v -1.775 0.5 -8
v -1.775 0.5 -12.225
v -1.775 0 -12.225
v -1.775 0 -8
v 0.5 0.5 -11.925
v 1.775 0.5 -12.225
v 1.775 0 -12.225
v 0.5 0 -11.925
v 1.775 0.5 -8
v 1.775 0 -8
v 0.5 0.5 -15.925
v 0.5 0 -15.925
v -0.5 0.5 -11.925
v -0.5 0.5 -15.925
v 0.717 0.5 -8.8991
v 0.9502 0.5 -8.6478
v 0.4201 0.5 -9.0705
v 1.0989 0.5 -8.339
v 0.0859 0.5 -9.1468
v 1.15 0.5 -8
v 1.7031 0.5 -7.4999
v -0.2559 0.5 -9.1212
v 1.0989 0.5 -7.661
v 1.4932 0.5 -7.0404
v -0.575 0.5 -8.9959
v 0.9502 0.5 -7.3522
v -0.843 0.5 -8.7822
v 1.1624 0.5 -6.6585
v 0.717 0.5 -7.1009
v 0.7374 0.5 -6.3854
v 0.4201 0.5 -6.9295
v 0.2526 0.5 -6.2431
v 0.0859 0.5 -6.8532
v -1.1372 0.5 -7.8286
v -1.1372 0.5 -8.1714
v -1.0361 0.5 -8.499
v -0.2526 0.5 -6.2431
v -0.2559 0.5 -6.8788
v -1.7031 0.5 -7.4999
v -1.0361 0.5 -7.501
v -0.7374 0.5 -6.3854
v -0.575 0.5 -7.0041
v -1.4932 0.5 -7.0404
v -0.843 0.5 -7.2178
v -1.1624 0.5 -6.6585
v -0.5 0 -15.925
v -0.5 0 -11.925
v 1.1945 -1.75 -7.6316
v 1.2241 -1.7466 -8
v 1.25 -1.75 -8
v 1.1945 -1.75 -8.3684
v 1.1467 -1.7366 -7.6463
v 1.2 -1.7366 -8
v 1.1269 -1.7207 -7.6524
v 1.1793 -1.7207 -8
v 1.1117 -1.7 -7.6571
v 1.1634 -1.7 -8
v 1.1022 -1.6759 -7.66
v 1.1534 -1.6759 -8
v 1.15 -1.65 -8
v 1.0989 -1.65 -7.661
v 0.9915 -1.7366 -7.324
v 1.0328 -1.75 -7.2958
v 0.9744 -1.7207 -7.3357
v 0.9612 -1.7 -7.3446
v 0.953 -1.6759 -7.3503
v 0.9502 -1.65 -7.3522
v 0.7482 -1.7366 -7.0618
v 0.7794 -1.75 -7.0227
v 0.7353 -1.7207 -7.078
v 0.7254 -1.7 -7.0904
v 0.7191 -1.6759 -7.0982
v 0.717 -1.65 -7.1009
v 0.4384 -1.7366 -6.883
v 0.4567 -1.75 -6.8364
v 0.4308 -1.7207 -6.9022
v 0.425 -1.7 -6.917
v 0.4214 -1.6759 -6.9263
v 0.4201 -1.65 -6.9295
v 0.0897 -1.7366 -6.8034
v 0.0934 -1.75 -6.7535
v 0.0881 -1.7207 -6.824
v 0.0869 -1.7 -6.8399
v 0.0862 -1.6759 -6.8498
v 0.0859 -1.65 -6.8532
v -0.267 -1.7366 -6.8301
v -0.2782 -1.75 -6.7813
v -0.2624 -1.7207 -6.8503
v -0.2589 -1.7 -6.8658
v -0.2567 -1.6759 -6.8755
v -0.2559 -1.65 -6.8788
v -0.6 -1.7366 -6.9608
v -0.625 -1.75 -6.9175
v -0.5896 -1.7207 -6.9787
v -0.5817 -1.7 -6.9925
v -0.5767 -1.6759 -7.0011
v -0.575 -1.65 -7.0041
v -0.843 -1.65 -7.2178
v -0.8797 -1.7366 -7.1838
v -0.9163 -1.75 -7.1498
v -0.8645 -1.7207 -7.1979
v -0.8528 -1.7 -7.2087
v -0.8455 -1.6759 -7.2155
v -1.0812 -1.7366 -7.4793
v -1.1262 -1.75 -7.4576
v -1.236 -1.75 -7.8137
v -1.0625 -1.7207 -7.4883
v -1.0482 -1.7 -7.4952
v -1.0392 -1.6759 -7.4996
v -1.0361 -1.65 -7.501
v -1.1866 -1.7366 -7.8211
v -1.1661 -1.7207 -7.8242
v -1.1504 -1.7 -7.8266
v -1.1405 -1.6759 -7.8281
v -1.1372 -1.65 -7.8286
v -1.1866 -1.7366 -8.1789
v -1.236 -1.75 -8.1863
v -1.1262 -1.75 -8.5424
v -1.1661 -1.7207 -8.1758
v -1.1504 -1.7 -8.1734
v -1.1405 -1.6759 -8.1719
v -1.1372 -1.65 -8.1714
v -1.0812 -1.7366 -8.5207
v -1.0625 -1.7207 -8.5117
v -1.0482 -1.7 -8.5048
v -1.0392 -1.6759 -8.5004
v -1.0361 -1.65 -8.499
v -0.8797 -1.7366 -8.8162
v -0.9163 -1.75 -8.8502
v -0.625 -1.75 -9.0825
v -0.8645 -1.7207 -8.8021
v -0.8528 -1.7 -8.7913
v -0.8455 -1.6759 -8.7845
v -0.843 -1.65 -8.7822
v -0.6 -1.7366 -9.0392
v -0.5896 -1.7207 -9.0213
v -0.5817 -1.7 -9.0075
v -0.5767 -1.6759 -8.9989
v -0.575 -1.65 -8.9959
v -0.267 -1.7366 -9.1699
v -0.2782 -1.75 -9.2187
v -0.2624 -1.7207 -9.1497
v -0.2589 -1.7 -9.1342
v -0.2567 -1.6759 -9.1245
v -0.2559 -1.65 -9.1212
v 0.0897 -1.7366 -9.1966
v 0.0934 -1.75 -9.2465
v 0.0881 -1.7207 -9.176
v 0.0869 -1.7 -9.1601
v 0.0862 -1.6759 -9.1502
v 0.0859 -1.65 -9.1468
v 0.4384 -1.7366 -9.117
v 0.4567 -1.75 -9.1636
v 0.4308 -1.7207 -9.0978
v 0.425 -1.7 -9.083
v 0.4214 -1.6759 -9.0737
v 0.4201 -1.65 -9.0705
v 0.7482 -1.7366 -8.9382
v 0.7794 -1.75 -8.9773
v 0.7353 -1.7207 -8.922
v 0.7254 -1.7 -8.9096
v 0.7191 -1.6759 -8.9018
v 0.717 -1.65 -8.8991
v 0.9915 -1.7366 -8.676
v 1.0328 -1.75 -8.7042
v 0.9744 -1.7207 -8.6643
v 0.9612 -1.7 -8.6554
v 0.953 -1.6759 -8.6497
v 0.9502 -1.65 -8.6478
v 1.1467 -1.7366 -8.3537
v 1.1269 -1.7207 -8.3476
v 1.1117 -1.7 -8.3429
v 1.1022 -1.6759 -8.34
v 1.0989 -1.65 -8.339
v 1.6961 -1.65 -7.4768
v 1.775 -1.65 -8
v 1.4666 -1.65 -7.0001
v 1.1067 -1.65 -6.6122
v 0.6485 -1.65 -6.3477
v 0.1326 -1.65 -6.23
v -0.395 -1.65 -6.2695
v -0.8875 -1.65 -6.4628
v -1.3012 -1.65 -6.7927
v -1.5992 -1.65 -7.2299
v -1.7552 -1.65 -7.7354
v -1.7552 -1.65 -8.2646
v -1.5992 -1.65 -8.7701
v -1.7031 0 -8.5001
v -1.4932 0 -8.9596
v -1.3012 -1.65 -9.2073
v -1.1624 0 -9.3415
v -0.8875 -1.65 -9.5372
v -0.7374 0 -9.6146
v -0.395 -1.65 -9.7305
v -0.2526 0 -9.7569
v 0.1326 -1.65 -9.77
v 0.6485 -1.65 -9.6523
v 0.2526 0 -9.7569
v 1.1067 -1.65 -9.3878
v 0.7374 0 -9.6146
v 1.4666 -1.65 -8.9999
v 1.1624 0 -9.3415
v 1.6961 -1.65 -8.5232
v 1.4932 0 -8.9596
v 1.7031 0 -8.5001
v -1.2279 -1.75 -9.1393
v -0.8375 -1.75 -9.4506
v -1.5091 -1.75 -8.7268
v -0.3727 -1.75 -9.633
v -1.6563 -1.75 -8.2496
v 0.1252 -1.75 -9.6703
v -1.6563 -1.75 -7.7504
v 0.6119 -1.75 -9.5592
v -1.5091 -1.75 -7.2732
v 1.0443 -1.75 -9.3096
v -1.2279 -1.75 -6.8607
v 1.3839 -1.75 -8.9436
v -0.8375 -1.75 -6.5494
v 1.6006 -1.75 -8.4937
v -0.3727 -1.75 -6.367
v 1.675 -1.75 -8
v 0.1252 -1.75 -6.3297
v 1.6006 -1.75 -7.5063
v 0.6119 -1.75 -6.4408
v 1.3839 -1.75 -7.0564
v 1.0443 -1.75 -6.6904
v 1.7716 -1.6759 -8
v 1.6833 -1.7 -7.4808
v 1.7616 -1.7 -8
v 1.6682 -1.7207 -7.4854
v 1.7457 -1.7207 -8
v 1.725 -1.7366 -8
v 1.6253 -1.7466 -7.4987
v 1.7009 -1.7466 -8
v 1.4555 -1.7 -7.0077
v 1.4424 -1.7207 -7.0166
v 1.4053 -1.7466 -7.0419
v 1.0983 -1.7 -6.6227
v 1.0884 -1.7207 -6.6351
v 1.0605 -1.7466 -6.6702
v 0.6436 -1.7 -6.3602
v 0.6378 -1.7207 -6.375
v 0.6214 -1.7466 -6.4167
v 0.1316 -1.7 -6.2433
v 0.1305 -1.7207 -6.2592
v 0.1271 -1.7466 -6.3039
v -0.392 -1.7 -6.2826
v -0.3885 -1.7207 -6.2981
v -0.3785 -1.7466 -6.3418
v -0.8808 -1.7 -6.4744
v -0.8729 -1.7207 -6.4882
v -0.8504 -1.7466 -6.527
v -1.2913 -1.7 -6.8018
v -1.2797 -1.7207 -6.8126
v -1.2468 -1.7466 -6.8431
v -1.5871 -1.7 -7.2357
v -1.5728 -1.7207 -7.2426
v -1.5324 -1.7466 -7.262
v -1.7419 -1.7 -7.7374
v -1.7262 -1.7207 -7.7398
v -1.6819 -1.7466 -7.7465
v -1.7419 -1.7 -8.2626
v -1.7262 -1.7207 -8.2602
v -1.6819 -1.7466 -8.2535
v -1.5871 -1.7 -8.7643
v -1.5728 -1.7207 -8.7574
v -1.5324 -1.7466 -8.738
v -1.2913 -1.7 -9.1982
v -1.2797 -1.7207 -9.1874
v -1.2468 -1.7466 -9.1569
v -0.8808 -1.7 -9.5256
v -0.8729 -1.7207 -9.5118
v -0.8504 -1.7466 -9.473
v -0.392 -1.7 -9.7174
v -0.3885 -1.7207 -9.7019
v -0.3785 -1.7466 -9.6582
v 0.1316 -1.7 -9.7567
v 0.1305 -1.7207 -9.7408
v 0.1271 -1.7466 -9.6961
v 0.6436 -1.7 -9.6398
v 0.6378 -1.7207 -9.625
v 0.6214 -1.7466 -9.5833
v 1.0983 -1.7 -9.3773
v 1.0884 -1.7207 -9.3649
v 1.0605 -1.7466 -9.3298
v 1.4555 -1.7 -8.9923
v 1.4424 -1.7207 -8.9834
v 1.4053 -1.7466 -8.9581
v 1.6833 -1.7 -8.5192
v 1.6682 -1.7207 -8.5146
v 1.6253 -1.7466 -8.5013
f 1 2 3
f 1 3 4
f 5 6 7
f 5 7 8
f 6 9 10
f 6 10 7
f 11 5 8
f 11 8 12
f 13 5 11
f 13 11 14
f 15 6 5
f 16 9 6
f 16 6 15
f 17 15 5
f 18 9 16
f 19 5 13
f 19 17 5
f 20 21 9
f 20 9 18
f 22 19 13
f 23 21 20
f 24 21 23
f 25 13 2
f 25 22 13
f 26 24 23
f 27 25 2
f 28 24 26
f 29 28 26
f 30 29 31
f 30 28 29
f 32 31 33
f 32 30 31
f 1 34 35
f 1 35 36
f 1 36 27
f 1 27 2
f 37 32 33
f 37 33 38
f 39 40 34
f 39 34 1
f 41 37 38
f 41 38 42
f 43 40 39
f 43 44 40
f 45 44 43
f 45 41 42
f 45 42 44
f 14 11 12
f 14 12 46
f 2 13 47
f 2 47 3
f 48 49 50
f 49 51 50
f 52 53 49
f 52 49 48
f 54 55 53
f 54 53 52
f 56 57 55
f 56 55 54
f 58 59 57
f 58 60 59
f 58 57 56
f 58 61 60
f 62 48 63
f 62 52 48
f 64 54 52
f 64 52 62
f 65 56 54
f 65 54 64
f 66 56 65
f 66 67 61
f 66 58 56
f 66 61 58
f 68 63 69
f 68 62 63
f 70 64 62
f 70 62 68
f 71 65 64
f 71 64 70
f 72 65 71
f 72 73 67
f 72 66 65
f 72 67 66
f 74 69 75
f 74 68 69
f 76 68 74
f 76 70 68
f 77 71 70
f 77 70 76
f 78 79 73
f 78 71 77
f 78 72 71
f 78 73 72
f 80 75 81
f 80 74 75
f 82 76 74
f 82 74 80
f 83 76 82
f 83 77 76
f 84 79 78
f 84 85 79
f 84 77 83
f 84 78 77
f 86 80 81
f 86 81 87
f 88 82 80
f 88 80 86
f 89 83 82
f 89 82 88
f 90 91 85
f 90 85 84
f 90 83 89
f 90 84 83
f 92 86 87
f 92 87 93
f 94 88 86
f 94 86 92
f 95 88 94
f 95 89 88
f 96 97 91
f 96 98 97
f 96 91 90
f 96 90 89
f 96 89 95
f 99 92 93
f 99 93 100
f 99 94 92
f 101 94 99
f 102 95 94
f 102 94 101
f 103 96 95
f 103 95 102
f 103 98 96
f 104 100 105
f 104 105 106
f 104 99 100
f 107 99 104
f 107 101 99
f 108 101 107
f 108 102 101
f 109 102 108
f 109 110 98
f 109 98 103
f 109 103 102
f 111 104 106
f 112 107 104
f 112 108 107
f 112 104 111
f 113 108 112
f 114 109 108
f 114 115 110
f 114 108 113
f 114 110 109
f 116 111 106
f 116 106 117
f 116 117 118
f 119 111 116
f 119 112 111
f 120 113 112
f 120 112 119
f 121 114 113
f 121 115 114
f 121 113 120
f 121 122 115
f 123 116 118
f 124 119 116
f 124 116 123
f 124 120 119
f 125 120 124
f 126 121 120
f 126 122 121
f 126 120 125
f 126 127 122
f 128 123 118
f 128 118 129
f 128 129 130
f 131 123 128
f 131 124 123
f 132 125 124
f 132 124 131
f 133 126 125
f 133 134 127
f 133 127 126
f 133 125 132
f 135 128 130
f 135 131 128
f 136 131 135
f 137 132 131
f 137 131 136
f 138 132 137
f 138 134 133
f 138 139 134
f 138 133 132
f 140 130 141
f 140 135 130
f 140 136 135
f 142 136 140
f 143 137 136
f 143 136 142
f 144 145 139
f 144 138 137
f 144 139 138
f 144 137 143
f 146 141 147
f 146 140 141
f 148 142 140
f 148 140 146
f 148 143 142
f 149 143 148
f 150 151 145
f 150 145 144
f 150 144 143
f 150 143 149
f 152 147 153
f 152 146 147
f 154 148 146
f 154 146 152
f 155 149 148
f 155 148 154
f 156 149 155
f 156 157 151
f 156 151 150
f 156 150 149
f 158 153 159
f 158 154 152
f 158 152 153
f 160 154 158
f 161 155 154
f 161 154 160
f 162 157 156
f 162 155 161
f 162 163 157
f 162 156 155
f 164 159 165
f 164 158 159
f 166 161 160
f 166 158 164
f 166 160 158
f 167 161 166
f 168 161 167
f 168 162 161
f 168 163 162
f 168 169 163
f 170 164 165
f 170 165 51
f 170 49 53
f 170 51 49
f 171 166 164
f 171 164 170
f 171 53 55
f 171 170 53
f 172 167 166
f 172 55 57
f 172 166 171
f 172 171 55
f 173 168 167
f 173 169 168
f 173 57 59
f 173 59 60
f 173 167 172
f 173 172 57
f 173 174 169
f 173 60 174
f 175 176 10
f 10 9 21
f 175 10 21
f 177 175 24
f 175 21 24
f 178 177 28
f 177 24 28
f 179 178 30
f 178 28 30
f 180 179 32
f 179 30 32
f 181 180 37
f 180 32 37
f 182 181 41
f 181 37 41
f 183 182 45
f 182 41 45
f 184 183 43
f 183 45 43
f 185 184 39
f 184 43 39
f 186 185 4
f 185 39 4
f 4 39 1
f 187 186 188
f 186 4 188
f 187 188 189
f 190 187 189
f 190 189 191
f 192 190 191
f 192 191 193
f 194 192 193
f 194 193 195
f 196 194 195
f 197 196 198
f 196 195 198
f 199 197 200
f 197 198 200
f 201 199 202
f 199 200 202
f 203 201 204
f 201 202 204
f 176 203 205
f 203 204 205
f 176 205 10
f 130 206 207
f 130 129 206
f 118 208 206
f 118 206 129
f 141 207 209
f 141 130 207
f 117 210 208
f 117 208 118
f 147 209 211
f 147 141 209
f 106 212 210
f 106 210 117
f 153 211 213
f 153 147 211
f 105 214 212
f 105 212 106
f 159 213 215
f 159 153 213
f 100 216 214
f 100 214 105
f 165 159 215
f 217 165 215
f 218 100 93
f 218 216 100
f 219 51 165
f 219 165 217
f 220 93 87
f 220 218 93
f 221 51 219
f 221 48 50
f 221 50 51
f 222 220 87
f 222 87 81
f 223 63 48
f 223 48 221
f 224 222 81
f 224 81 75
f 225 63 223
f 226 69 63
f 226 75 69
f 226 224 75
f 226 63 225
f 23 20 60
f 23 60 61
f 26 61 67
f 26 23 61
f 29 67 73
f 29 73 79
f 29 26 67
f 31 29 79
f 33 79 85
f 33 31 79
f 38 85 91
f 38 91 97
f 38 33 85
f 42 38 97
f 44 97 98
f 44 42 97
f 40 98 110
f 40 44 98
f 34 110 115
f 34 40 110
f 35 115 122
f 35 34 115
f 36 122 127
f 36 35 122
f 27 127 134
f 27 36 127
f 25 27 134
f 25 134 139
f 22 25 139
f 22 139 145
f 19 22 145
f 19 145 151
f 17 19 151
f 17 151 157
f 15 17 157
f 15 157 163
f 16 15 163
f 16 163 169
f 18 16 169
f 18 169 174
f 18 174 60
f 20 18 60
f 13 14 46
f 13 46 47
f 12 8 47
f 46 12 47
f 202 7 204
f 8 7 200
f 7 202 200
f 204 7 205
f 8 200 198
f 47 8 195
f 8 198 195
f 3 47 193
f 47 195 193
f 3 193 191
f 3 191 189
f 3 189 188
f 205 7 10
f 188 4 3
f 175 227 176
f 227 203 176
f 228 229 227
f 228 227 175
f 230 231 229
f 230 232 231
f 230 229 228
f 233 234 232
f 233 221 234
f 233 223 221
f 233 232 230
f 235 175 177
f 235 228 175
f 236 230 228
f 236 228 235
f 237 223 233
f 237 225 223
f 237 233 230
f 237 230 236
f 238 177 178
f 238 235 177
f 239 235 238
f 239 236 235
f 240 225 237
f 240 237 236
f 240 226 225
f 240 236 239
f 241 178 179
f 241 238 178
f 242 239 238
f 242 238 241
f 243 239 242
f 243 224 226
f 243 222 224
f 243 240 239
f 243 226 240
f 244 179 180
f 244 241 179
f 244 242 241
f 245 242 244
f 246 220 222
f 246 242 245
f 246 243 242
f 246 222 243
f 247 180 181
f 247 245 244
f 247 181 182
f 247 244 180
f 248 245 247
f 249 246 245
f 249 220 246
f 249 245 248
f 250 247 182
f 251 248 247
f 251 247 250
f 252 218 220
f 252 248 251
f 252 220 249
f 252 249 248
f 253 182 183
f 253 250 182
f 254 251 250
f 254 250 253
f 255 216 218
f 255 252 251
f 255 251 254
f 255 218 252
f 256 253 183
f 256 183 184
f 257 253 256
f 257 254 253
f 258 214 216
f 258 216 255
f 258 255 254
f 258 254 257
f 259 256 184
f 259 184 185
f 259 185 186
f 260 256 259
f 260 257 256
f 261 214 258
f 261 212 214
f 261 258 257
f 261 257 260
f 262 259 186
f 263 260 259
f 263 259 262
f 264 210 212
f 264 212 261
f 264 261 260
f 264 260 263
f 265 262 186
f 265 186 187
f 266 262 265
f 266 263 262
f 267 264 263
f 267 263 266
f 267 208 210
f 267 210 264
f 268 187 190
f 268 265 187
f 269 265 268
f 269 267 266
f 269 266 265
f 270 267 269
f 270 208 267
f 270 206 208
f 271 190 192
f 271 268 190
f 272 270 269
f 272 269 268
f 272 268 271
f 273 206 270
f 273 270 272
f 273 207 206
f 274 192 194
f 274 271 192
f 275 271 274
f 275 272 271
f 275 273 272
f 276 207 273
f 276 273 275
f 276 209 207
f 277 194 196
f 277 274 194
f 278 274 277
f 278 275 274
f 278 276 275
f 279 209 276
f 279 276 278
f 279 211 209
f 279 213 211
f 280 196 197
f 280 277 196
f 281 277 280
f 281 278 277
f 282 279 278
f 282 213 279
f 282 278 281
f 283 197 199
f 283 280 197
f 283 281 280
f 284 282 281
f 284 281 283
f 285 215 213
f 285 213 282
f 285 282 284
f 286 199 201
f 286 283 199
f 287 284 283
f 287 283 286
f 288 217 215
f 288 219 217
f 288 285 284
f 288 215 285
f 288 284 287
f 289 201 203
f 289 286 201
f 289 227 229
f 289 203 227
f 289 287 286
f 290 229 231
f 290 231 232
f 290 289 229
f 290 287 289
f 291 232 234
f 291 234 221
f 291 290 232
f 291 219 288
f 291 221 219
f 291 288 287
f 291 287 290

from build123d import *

# Parameters (mm, degrees)
SKETCH005_R   = 1.15
PAD004_DEPTH  = 0.5
SKETCH006_R   = 1.775
SKETCH006_R_2 = 1.15
PAD005_DEPTH  = 1.75
FILLET002_R   = 0.1


with BuildPart() as part:
    # Sketch005 → Pad004 (new body)
    with BuildSketch(Plane.XZ):
        with BuildLine():
            Line((1.775, 0), (1.775, -4.225))
            Line((1.775, -4.225), (0.5, -3.925))
            Line((0.5, -3.925), (0.5, -7.925))
            Line((0.5, -7.925), (-0.5, -7.925))
            Line((-0.5, -7.925), (-0.5, -3.925))
            Line((-0.5, -3.925), (-1.775, -4.225))
            Line((-1.775, -4.225), (-1.775, 0))
            ThreePointArc((1.775, 0), (0, 1.775), (-1.775, 0))
        make_face()
        Circle(SKETCH005_R, mode=Mode.SUBTRACT)
    extrude(amount=PAD004_DEPTH)

    # Sketch006 (on Face11 of Pad004) → Pad005 (join)
    with BuildSketch(Plane.XZ.offset(0.5)):
        Circle(SKETCH006_R)
        Circle(SKETCH006_R_2, mode=Mode.SUBTRACT)
    extrude(amount=PAD005_DEPTH)

    # Fillet002
    fillet002_edges = [part.edges().sort_by_distance(p)[0] for p in [
        (-1.775, -2.25, 0),
        (-1.15, -2.25, 0),
    ]]
    fillet(fillet002_edges, radius=FILLET002_R)


with BuildPart() as part_1:
    # Body003 placement: moved
    add(part.part.moved(Location((0, 0.5, -8))))


solid = part_1.part
